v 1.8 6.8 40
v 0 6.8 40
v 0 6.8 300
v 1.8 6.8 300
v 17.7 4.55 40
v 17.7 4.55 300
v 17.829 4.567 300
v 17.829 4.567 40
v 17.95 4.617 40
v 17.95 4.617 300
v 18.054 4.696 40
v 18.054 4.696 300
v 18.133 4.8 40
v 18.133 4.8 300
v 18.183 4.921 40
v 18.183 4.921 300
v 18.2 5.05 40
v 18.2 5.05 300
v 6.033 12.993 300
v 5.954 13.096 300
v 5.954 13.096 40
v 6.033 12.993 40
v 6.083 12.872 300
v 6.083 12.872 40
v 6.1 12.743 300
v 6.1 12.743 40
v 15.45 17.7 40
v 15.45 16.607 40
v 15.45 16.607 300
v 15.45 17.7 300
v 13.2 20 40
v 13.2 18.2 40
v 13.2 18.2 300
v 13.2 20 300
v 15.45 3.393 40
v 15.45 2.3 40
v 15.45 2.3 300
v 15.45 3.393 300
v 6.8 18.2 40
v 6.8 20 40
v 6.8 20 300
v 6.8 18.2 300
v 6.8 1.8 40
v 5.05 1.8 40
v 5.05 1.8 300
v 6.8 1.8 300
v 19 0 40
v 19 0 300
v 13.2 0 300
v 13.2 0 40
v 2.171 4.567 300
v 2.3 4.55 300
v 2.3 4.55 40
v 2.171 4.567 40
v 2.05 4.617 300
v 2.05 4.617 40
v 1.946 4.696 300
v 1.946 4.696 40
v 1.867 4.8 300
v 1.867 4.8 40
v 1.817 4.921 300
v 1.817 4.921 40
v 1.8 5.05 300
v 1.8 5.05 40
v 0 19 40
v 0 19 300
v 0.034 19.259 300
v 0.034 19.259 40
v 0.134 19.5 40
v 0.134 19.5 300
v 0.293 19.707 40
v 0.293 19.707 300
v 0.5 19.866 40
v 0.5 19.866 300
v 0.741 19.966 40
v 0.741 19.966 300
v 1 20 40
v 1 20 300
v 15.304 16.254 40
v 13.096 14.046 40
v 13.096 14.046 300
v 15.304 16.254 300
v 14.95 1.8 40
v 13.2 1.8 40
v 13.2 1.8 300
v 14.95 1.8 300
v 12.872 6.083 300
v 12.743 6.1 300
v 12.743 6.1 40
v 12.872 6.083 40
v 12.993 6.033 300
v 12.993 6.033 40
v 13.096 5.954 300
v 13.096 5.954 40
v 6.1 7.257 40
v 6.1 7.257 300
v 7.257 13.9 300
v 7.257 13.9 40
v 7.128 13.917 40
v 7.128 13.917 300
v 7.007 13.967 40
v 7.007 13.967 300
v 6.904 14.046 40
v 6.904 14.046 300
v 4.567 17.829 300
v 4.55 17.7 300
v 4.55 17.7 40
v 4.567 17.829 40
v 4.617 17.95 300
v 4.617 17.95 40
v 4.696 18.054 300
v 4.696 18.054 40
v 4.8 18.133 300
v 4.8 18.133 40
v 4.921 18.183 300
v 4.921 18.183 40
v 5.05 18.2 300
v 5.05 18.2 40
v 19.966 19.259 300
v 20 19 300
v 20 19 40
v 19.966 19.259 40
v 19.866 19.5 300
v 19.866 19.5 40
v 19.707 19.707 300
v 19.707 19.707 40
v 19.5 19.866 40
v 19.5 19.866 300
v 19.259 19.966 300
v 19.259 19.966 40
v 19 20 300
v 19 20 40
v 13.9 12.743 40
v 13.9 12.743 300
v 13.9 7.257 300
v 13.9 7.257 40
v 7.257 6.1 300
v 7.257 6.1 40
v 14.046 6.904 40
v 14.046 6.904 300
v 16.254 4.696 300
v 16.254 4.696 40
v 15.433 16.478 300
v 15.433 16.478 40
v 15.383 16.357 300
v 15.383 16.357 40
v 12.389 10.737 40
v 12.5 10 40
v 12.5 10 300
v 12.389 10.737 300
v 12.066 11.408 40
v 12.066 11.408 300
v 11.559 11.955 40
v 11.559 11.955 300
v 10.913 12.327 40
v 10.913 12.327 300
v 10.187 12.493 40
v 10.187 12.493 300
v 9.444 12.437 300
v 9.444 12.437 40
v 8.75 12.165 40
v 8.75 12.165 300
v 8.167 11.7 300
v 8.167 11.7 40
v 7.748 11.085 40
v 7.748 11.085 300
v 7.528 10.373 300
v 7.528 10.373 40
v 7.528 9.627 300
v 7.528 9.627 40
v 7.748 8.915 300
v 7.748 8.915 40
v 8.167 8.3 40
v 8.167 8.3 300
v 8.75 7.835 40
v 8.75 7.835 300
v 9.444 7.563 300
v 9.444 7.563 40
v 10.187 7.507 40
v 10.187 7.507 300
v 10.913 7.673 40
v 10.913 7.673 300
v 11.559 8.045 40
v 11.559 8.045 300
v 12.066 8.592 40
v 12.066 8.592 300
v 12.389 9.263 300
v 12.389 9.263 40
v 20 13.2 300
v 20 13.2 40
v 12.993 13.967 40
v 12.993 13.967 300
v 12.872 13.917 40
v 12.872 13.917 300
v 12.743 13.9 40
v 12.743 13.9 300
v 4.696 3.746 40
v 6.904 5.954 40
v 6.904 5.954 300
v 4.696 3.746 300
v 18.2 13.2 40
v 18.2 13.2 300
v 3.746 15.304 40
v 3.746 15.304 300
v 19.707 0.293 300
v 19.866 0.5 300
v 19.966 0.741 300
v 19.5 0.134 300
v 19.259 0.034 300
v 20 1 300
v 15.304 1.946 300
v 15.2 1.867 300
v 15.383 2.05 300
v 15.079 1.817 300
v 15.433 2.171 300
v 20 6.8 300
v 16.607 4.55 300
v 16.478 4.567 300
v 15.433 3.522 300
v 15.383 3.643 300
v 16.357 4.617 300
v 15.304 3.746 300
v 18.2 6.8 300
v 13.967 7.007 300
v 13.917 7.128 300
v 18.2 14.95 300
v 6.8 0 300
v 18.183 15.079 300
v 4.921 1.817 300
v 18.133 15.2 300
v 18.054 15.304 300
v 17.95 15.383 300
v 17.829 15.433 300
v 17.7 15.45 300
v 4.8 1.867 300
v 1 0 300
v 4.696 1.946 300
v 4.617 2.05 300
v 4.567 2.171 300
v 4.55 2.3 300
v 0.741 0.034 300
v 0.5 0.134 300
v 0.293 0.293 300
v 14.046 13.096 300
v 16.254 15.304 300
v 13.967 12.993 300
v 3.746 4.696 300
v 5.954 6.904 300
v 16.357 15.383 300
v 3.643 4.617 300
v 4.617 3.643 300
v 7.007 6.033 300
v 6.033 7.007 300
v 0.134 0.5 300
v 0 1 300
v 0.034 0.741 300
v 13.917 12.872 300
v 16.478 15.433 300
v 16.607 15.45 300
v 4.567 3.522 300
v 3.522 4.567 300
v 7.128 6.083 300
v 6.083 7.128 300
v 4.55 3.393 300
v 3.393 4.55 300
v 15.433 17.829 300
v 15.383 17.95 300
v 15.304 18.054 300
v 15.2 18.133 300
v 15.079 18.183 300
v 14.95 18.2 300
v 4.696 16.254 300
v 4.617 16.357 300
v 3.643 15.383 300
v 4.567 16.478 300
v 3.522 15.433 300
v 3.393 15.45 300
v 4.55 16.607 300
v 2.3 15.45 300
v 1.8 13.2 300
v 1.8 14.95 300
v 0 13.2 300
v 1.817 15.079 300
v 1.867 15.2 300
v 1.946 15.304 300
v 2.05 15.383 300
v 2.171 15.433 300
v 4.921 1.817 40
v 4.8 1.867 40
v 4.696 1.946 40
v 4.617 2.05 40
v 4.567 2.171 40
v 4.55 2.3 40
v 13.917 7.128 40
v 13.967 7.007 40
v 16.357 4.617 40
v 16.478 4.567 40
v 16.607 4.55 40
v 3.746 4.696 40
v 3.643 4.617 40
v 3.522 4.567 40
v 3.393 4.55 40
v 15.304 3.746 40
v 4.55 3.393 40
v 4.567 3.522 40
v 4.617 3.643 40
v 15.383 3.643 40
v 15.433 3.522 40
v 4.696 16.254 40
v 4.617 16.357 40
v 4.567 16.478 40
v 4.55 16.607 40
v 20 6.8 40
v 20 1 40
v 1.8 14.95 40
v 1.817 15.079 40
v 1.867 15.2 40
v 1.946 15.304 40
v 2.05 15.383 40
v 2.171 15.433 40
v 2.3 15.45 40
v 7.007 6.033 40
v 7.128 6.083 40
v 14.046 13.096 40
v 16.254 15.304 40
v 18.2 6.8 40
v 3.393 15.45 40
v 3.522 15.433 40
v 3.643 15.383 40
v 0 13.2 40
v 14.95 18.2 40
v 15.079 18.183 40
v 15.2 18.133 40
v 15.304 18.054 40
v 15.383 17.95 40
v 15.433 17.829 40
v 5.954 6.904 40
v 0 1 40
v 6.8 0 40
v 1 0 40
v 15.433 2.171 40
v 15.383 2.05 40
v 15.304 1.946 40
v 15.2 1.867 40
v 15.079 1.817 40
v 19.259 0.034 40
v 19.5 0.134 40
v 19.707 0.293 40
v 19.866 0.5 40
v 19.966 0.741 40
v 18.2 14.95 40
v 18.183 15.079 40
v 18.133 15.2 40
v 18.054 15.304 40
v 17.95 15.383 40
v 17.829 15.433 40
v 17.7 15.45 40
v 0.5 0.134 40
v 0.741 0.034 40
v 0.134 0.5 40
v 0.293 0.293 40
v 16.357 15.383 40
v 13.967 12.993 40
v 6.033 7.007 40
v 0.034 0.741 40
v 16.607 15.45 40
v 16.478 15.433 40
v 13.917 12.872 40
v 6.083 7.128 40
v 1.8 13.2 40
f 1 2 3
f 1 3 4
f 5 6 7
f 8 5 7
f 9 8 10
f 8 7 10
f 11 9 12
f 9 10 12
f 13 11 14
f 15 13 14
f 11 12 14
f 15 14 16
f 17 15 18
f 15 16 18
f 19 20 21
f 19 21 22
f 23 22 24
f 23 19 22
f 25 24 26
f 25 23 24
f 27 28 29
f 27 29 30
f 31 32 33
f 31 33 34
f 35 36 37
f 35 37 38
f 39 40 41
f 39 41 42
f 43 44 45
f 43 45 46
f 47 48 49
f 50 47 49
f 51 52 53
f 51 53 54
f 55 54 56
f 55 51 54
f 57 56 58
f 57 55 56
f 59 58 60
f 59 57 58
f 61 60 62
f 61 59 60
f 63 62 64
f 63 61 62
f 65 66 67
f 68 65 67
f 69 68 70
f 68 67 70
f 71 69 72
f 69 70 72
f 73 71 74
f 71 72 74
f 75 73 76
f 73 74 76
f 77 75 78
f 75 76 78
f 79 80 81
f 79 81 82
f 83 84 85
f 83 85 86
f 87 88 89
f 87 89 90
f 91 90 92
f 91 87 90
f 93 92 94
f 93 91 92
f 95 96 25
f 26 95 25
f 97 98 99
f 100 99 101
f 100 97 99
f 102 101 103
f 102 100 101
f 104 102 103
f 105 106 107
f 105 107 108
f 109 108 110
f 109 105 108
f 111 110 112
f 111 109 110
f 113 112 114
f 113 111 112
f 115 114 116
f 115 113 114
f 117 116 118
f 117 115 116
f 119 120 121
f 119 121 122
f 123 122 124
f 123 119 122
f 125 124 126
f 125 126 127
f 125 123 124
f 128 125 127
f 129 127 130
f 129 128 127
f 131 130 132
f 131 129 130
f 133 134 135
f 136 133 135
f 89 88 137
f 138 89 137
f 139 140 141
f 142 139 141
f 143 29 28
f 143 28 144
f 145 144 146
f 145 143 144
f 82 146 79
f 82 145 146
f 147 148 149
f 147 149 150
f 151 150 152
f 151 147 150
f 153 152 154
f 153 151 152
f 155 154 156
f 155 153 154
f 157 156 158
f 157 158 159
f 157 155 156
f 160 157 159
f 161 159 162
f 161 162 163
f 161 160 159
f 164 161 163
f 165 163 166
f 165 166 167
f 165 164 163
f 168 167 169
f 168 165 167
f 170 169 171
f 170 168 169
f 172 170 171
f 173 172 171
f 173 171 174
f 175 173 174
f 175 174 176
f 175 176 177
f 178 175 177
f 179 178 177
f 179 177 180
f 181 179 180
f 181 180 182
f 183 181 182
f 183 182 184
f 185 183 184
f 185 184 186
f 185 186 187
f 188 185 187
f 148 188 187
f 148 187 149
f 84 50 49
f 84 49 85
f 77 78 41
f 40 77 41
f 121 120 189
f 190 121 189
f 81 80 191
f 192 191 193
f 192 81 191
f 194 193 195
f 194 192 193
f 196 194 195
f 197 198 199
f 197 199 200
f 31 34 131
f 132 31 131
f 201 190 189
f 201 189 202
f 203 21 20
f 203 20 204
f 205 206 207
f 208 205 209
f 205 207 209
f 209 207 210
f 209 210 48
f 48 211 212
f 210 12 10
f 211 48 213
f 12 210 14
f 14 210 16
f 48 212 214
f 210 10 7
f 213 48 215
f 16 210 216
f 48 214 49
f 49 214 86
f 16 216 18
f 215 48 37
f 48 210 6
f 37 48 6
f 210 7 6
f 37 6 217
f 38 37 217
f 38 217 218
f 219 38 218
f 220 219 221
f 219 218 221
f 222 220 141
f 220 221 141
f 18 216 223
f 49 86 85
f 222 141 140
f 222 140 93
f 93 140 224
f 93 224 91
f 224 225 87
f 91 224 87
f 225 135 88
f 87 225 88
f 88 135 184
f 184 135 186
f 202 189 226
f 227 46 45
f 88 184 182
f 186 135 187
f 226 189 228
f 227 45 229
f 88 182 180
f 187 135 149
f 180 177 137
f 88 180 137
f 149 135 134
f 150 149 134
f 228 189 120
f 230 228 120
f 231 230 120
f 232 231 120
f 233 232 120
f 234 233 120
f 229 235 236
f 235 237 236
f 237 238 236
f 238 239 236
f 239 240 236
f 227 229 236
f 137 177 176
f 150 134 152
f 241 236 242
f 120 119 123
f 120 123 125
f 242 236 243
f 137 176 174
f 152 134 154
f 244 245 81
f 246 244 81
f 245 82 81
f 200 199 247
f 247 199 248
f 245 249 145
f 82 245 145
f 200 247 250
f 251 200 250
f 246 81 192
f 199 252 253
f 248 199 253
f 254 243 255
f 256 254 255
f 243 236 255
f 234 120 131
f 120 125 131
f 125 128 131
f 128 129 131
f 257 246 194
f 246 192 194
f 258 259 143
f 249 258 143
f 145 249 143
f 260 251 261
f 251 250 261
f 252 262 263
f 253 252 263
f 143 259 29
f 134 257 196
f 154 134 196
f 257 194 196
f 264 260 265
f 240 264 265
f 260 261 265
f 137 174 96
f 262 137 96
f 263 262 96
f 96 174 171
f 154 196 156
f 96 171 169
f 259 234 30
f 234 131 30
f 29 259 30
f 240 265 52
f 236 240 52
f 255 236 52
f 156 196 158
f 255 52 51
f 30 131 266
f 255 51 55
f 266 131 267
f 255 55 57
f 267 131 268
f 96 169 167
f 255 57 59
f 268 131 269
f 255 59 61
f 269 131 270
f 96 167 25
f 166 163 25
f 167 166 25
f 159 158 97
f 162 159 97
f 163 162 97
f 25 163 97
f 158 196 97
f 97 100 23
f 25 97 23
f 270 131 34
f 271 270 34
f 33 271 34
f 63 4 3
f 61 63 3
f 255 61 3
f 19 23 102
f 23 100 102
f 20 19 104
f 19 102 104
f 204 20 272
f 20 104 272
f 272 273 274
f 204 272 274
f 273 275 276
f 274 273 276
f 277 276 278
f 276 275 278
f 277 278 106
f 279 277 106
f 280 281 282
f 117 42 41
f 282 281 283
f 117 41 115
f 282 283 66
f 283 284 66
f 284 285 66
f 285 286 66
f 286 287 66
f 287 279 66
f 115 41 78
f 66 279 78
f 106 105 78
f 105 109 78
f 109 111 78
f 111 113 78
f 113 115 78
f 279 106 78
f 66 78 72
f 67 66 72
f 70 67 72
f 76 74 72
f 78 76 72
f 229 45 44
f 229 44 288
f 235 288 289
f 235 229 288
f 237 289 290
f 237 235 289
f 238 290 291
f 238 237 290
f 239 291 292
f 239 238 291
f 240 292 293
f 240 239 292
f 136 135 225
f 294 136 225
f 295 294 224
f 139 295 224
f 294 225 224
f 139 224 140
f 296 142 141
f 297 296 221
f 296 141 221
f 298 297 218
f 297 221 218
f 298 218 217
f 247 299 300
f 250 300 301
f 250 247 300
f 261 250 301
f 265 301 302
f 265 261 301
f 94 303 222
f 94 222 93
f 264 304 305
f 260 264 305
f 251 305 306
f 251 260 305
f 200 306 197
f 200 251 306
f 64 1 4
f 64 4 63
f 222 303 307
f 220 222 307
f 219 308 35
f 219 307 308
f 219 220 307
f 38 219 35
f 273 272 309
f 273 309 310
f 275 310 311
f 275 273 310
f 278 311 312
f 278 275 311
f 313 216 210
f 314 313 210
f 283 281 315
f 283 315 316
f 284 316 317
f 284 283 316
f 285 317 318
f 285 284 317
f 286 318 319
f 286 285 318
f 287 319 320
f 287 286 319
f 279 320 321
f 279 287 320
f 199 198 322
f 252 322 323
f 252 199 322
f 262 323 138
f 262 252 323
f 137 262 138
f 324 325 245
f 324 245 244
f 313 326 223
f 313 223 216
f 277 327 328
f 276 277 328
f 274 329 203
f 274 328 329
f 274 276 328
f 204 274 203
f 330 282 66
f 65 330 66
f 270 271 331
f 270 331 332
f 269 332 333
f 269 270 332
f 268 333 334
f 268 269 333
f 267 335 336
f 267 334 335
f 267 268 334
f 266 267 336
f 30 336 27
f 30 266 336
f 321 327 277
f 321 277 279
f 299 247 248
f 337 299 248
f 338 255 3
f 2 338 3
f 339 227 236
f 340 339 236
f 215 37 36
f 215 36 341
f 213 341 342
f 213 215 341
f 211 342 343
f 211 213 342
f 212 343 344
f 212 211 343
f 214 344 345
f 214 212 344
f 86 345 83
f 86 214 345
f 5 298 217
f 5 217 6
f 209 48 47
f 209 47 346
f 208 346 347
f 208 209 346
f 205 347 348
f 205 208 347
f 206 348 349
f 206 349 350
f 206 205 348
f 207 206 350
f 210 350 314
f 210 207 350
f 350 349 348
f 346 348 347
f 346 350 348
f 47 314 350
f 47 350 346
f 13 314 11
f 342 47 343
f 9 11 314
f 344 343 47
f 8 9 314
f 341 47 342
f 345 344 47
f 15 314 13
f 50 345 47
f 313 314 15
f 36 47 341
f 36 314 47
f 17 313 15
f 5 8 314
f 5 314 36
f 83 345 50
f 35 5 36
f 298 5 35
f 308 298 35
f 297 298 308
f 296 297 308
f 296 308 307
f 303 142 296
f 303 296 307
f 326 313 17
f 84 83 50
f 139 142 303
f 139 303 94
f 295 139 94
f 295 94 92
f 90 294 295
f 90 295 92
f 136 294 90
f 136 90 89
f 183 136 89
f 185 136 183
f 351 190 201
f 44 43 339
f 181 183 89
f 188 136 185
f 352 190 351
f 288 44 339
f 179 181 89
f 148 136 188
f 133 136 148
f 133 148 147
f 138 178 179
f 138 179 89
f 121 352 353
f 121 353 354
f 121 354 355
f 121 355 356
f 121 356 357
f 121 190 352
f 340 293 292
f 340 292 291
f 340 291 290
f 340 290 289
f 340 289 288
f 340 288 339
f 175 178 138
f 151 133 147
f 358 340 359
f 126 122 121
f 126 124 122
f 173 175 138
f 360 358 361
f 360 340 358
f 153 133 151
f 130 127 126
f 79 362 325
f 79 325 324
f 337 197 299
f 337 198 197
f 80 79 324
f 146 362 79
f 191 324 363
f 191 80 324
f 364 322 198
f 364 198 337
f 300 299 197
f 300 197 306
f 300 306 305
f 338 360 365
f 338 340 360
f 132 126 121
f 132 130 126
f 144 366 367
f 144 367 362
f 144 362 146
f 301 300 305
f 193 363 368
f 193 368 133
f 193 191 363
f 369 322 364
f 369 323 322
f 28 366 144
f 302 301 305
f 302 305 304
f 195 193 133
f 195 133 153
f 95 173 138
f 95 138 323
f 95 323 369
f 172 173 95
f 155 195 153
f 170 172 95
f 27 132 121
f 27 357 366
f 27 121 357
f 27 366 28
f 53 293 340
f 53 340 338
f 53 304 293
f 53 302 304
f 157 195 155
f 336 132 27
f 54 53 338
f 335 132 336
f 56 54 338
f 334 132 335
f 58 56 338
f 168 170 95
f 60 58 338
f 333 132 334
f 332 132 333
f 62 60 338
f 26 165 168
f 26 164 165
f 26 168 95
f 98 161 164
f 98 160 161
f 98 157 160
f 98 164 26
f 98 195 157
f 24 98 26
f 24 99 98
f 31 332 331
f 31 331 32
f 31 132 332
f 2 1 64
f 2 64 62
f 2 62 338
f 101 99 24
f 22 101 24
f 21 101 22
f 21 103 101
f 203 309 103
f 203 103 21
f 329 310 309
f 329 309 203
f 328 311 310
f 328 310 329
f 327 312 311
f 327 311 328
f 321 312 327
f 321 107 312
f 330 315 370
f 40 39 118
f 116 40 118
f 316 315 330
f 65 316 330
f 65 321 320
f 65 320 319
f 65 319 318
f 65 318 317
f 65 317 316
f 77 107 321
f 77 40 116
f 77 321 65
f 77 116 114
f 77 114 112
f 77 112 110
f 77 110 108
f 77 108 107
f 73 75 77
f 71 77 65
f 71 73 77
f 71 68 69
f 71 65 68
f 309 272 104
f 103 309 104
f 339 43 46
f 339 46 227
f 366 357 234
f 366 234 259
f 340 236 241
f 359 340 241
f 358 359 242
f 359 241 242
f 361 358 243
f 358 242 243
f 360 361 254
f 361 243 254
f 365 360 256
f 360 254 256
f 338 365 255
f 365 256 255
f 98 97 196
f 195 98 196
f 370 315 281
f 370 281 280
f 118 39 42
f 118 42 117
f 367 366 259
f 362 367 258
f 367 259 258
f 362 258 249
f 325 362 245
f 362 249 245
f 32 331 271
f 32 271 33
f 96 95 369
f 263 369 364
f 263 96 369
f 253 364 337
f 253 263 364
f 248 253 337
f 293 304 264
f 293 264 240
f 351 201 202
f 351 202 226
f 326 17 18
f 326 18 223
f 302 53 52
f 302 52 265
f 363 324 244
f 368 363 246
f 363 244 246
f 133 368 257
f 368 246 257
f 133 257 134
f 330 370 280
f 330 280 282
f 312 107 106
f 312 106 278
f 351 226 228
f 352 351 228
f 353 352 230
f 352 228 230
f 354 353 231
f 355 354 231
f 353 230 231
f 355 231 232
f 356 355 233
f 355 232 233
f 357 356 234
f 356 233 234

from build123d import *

# Parameters (mm, degrees)
SKETCH1_R           = 2.5
BOSS_EXTRUDE1_DEPTH = 300
FILLET1_R           = 1
FILLET2_R           = 0.5
FILLET3_R           = 0.5
FILLET4_R           = 0.5
FILLET5_R           = 0.5
SKETCH4_W           = 85.130466005
SKETCH4_H           = 76.492403511
CUT_EXTRUDE4_DEPTH  = 40


with BuildPart() as part:
    # Sketch1 → Boss-Extrude1 (new body)
    with BuildSketch(Plane.XY):
        Polygon((13.2, 0), (13.2, 1.8), (15.45, 1.8), (15.45, 3.6), (12.95, 6.1), (7.05, 6.1), (4.55, 3.6), (4.55, 1.8), (6.8, 1.8), (6.8, 0), (0, 0), (0, 6.8), (1.8, 6.8), (1.8, 4.55), (3.6, 4.55), (6.1, 7.05), (6.1, 12.95), (3.6, 15.45), (1.8, 15.45), (1.8, 13.2), (0, 13.2), (0, 20), (6.8, 20), (6.8, 18.2), (4.55, 18.2), (4.55, 16.4), (7.05, 13.9), (12.95, 13.9), (15.45, 16.4), (15.45, 18.2), (13.2, 18.2), (13.2, 20), (20, 20), (20, 13.2), (18.2, 13.2), (18.2, 15.45), (16.4, 15.45), (13.9, 12.95), (13.9, 7.05), (16.4, 4.55), (18.2, 4.55), (18.2, 6.8), (20, 6.8), (20, 0), align=None)
        with Locations((10, 10)):
            Circle(SKETCH1_R, mode=Mode.SUBTRACT)
    extrude(amount=BOSS_EXTRUDE1_DEPTH)

    # Fillet1
    fillet1_edges = [part.edges().sort_by_distance(p)[0] for p in [
        (0, 0, 150),
        (0, 20, 150),
        (20, 20, 150),
        (20, 0, 150),
    ]]
    fillet(fillet1_edges, radius=FILLET1_R)

    # Fillet2
    fillet2_edges = [part.edges().sort_by_distance(p)[0] for p in [
        (4.55, 18.2, 150),
        (4.55, 16.4, 150),
        (7.05, 13.9, 150),
        (12.95, 13.9, 150),
        (15.45, 16.4, 150),
        (15.45, 18.2, 150),
    ]]
    fillet(fillet2_edges, radius=FILLET2_R)

    # Fillet3
    fillet3_edges = [part.edges().sort_by_distance(p)[0] for p in [
        (18.2, 15.45, 150),
        (16.4, 15.45, 150),
        (13.9, 12.95, 150),
        (13.9, 7.05, 150),
        (16.4, 4.55, 150),
        (18.2, 4.55, 150),
    ]]
    fillet(fillet3_edges, radius=FILLET3_R)

    # Fillet4
    fillet4_edges = [part.edges().sort_by_distance(p)[0] for p in [
        (1.8, 4.55, 150),
        (3.6, 4.55, 150),
        (6.1, 7.05, 150),
        (6.1, 12.95, 150),
        (3.6, 15.45, 150),
        (1.8, 15.45, 150),
    ]]
    fillet(fillet4_edges, radius=FILLET4_R)

    # Fillet5
    fillet5_edges = [part.edges().sort_by_distance(p)[0] for p in [
        (15.45, 1.8, 150),
        (15.45, 3.6, 150),
        (12.95, 6.1, 150),
        (7.05, 6.1, 150),
        (4.55, 3.6, 150),
        (4.55, 1.8, 150),
    ]]
    fillet(fillet5_edges, radius=FILLET5_R)

    # Sketch4 → Cut-Extrude4 (cut)
    with BuildSketch(Plane(origin=(0, 0, 0), x_dir=(-1, 0, 0), z_dir=(0, 0, -1))):
        with Locations((13.179490335, -10.50880322)):
            Rectangle(SKETCH4_W, SKETCH4_H)
    extrude(amount=-CUT_EXTRUDE4_DEPTH, mode=Mode.SUBTRACT)


solid = part.part
